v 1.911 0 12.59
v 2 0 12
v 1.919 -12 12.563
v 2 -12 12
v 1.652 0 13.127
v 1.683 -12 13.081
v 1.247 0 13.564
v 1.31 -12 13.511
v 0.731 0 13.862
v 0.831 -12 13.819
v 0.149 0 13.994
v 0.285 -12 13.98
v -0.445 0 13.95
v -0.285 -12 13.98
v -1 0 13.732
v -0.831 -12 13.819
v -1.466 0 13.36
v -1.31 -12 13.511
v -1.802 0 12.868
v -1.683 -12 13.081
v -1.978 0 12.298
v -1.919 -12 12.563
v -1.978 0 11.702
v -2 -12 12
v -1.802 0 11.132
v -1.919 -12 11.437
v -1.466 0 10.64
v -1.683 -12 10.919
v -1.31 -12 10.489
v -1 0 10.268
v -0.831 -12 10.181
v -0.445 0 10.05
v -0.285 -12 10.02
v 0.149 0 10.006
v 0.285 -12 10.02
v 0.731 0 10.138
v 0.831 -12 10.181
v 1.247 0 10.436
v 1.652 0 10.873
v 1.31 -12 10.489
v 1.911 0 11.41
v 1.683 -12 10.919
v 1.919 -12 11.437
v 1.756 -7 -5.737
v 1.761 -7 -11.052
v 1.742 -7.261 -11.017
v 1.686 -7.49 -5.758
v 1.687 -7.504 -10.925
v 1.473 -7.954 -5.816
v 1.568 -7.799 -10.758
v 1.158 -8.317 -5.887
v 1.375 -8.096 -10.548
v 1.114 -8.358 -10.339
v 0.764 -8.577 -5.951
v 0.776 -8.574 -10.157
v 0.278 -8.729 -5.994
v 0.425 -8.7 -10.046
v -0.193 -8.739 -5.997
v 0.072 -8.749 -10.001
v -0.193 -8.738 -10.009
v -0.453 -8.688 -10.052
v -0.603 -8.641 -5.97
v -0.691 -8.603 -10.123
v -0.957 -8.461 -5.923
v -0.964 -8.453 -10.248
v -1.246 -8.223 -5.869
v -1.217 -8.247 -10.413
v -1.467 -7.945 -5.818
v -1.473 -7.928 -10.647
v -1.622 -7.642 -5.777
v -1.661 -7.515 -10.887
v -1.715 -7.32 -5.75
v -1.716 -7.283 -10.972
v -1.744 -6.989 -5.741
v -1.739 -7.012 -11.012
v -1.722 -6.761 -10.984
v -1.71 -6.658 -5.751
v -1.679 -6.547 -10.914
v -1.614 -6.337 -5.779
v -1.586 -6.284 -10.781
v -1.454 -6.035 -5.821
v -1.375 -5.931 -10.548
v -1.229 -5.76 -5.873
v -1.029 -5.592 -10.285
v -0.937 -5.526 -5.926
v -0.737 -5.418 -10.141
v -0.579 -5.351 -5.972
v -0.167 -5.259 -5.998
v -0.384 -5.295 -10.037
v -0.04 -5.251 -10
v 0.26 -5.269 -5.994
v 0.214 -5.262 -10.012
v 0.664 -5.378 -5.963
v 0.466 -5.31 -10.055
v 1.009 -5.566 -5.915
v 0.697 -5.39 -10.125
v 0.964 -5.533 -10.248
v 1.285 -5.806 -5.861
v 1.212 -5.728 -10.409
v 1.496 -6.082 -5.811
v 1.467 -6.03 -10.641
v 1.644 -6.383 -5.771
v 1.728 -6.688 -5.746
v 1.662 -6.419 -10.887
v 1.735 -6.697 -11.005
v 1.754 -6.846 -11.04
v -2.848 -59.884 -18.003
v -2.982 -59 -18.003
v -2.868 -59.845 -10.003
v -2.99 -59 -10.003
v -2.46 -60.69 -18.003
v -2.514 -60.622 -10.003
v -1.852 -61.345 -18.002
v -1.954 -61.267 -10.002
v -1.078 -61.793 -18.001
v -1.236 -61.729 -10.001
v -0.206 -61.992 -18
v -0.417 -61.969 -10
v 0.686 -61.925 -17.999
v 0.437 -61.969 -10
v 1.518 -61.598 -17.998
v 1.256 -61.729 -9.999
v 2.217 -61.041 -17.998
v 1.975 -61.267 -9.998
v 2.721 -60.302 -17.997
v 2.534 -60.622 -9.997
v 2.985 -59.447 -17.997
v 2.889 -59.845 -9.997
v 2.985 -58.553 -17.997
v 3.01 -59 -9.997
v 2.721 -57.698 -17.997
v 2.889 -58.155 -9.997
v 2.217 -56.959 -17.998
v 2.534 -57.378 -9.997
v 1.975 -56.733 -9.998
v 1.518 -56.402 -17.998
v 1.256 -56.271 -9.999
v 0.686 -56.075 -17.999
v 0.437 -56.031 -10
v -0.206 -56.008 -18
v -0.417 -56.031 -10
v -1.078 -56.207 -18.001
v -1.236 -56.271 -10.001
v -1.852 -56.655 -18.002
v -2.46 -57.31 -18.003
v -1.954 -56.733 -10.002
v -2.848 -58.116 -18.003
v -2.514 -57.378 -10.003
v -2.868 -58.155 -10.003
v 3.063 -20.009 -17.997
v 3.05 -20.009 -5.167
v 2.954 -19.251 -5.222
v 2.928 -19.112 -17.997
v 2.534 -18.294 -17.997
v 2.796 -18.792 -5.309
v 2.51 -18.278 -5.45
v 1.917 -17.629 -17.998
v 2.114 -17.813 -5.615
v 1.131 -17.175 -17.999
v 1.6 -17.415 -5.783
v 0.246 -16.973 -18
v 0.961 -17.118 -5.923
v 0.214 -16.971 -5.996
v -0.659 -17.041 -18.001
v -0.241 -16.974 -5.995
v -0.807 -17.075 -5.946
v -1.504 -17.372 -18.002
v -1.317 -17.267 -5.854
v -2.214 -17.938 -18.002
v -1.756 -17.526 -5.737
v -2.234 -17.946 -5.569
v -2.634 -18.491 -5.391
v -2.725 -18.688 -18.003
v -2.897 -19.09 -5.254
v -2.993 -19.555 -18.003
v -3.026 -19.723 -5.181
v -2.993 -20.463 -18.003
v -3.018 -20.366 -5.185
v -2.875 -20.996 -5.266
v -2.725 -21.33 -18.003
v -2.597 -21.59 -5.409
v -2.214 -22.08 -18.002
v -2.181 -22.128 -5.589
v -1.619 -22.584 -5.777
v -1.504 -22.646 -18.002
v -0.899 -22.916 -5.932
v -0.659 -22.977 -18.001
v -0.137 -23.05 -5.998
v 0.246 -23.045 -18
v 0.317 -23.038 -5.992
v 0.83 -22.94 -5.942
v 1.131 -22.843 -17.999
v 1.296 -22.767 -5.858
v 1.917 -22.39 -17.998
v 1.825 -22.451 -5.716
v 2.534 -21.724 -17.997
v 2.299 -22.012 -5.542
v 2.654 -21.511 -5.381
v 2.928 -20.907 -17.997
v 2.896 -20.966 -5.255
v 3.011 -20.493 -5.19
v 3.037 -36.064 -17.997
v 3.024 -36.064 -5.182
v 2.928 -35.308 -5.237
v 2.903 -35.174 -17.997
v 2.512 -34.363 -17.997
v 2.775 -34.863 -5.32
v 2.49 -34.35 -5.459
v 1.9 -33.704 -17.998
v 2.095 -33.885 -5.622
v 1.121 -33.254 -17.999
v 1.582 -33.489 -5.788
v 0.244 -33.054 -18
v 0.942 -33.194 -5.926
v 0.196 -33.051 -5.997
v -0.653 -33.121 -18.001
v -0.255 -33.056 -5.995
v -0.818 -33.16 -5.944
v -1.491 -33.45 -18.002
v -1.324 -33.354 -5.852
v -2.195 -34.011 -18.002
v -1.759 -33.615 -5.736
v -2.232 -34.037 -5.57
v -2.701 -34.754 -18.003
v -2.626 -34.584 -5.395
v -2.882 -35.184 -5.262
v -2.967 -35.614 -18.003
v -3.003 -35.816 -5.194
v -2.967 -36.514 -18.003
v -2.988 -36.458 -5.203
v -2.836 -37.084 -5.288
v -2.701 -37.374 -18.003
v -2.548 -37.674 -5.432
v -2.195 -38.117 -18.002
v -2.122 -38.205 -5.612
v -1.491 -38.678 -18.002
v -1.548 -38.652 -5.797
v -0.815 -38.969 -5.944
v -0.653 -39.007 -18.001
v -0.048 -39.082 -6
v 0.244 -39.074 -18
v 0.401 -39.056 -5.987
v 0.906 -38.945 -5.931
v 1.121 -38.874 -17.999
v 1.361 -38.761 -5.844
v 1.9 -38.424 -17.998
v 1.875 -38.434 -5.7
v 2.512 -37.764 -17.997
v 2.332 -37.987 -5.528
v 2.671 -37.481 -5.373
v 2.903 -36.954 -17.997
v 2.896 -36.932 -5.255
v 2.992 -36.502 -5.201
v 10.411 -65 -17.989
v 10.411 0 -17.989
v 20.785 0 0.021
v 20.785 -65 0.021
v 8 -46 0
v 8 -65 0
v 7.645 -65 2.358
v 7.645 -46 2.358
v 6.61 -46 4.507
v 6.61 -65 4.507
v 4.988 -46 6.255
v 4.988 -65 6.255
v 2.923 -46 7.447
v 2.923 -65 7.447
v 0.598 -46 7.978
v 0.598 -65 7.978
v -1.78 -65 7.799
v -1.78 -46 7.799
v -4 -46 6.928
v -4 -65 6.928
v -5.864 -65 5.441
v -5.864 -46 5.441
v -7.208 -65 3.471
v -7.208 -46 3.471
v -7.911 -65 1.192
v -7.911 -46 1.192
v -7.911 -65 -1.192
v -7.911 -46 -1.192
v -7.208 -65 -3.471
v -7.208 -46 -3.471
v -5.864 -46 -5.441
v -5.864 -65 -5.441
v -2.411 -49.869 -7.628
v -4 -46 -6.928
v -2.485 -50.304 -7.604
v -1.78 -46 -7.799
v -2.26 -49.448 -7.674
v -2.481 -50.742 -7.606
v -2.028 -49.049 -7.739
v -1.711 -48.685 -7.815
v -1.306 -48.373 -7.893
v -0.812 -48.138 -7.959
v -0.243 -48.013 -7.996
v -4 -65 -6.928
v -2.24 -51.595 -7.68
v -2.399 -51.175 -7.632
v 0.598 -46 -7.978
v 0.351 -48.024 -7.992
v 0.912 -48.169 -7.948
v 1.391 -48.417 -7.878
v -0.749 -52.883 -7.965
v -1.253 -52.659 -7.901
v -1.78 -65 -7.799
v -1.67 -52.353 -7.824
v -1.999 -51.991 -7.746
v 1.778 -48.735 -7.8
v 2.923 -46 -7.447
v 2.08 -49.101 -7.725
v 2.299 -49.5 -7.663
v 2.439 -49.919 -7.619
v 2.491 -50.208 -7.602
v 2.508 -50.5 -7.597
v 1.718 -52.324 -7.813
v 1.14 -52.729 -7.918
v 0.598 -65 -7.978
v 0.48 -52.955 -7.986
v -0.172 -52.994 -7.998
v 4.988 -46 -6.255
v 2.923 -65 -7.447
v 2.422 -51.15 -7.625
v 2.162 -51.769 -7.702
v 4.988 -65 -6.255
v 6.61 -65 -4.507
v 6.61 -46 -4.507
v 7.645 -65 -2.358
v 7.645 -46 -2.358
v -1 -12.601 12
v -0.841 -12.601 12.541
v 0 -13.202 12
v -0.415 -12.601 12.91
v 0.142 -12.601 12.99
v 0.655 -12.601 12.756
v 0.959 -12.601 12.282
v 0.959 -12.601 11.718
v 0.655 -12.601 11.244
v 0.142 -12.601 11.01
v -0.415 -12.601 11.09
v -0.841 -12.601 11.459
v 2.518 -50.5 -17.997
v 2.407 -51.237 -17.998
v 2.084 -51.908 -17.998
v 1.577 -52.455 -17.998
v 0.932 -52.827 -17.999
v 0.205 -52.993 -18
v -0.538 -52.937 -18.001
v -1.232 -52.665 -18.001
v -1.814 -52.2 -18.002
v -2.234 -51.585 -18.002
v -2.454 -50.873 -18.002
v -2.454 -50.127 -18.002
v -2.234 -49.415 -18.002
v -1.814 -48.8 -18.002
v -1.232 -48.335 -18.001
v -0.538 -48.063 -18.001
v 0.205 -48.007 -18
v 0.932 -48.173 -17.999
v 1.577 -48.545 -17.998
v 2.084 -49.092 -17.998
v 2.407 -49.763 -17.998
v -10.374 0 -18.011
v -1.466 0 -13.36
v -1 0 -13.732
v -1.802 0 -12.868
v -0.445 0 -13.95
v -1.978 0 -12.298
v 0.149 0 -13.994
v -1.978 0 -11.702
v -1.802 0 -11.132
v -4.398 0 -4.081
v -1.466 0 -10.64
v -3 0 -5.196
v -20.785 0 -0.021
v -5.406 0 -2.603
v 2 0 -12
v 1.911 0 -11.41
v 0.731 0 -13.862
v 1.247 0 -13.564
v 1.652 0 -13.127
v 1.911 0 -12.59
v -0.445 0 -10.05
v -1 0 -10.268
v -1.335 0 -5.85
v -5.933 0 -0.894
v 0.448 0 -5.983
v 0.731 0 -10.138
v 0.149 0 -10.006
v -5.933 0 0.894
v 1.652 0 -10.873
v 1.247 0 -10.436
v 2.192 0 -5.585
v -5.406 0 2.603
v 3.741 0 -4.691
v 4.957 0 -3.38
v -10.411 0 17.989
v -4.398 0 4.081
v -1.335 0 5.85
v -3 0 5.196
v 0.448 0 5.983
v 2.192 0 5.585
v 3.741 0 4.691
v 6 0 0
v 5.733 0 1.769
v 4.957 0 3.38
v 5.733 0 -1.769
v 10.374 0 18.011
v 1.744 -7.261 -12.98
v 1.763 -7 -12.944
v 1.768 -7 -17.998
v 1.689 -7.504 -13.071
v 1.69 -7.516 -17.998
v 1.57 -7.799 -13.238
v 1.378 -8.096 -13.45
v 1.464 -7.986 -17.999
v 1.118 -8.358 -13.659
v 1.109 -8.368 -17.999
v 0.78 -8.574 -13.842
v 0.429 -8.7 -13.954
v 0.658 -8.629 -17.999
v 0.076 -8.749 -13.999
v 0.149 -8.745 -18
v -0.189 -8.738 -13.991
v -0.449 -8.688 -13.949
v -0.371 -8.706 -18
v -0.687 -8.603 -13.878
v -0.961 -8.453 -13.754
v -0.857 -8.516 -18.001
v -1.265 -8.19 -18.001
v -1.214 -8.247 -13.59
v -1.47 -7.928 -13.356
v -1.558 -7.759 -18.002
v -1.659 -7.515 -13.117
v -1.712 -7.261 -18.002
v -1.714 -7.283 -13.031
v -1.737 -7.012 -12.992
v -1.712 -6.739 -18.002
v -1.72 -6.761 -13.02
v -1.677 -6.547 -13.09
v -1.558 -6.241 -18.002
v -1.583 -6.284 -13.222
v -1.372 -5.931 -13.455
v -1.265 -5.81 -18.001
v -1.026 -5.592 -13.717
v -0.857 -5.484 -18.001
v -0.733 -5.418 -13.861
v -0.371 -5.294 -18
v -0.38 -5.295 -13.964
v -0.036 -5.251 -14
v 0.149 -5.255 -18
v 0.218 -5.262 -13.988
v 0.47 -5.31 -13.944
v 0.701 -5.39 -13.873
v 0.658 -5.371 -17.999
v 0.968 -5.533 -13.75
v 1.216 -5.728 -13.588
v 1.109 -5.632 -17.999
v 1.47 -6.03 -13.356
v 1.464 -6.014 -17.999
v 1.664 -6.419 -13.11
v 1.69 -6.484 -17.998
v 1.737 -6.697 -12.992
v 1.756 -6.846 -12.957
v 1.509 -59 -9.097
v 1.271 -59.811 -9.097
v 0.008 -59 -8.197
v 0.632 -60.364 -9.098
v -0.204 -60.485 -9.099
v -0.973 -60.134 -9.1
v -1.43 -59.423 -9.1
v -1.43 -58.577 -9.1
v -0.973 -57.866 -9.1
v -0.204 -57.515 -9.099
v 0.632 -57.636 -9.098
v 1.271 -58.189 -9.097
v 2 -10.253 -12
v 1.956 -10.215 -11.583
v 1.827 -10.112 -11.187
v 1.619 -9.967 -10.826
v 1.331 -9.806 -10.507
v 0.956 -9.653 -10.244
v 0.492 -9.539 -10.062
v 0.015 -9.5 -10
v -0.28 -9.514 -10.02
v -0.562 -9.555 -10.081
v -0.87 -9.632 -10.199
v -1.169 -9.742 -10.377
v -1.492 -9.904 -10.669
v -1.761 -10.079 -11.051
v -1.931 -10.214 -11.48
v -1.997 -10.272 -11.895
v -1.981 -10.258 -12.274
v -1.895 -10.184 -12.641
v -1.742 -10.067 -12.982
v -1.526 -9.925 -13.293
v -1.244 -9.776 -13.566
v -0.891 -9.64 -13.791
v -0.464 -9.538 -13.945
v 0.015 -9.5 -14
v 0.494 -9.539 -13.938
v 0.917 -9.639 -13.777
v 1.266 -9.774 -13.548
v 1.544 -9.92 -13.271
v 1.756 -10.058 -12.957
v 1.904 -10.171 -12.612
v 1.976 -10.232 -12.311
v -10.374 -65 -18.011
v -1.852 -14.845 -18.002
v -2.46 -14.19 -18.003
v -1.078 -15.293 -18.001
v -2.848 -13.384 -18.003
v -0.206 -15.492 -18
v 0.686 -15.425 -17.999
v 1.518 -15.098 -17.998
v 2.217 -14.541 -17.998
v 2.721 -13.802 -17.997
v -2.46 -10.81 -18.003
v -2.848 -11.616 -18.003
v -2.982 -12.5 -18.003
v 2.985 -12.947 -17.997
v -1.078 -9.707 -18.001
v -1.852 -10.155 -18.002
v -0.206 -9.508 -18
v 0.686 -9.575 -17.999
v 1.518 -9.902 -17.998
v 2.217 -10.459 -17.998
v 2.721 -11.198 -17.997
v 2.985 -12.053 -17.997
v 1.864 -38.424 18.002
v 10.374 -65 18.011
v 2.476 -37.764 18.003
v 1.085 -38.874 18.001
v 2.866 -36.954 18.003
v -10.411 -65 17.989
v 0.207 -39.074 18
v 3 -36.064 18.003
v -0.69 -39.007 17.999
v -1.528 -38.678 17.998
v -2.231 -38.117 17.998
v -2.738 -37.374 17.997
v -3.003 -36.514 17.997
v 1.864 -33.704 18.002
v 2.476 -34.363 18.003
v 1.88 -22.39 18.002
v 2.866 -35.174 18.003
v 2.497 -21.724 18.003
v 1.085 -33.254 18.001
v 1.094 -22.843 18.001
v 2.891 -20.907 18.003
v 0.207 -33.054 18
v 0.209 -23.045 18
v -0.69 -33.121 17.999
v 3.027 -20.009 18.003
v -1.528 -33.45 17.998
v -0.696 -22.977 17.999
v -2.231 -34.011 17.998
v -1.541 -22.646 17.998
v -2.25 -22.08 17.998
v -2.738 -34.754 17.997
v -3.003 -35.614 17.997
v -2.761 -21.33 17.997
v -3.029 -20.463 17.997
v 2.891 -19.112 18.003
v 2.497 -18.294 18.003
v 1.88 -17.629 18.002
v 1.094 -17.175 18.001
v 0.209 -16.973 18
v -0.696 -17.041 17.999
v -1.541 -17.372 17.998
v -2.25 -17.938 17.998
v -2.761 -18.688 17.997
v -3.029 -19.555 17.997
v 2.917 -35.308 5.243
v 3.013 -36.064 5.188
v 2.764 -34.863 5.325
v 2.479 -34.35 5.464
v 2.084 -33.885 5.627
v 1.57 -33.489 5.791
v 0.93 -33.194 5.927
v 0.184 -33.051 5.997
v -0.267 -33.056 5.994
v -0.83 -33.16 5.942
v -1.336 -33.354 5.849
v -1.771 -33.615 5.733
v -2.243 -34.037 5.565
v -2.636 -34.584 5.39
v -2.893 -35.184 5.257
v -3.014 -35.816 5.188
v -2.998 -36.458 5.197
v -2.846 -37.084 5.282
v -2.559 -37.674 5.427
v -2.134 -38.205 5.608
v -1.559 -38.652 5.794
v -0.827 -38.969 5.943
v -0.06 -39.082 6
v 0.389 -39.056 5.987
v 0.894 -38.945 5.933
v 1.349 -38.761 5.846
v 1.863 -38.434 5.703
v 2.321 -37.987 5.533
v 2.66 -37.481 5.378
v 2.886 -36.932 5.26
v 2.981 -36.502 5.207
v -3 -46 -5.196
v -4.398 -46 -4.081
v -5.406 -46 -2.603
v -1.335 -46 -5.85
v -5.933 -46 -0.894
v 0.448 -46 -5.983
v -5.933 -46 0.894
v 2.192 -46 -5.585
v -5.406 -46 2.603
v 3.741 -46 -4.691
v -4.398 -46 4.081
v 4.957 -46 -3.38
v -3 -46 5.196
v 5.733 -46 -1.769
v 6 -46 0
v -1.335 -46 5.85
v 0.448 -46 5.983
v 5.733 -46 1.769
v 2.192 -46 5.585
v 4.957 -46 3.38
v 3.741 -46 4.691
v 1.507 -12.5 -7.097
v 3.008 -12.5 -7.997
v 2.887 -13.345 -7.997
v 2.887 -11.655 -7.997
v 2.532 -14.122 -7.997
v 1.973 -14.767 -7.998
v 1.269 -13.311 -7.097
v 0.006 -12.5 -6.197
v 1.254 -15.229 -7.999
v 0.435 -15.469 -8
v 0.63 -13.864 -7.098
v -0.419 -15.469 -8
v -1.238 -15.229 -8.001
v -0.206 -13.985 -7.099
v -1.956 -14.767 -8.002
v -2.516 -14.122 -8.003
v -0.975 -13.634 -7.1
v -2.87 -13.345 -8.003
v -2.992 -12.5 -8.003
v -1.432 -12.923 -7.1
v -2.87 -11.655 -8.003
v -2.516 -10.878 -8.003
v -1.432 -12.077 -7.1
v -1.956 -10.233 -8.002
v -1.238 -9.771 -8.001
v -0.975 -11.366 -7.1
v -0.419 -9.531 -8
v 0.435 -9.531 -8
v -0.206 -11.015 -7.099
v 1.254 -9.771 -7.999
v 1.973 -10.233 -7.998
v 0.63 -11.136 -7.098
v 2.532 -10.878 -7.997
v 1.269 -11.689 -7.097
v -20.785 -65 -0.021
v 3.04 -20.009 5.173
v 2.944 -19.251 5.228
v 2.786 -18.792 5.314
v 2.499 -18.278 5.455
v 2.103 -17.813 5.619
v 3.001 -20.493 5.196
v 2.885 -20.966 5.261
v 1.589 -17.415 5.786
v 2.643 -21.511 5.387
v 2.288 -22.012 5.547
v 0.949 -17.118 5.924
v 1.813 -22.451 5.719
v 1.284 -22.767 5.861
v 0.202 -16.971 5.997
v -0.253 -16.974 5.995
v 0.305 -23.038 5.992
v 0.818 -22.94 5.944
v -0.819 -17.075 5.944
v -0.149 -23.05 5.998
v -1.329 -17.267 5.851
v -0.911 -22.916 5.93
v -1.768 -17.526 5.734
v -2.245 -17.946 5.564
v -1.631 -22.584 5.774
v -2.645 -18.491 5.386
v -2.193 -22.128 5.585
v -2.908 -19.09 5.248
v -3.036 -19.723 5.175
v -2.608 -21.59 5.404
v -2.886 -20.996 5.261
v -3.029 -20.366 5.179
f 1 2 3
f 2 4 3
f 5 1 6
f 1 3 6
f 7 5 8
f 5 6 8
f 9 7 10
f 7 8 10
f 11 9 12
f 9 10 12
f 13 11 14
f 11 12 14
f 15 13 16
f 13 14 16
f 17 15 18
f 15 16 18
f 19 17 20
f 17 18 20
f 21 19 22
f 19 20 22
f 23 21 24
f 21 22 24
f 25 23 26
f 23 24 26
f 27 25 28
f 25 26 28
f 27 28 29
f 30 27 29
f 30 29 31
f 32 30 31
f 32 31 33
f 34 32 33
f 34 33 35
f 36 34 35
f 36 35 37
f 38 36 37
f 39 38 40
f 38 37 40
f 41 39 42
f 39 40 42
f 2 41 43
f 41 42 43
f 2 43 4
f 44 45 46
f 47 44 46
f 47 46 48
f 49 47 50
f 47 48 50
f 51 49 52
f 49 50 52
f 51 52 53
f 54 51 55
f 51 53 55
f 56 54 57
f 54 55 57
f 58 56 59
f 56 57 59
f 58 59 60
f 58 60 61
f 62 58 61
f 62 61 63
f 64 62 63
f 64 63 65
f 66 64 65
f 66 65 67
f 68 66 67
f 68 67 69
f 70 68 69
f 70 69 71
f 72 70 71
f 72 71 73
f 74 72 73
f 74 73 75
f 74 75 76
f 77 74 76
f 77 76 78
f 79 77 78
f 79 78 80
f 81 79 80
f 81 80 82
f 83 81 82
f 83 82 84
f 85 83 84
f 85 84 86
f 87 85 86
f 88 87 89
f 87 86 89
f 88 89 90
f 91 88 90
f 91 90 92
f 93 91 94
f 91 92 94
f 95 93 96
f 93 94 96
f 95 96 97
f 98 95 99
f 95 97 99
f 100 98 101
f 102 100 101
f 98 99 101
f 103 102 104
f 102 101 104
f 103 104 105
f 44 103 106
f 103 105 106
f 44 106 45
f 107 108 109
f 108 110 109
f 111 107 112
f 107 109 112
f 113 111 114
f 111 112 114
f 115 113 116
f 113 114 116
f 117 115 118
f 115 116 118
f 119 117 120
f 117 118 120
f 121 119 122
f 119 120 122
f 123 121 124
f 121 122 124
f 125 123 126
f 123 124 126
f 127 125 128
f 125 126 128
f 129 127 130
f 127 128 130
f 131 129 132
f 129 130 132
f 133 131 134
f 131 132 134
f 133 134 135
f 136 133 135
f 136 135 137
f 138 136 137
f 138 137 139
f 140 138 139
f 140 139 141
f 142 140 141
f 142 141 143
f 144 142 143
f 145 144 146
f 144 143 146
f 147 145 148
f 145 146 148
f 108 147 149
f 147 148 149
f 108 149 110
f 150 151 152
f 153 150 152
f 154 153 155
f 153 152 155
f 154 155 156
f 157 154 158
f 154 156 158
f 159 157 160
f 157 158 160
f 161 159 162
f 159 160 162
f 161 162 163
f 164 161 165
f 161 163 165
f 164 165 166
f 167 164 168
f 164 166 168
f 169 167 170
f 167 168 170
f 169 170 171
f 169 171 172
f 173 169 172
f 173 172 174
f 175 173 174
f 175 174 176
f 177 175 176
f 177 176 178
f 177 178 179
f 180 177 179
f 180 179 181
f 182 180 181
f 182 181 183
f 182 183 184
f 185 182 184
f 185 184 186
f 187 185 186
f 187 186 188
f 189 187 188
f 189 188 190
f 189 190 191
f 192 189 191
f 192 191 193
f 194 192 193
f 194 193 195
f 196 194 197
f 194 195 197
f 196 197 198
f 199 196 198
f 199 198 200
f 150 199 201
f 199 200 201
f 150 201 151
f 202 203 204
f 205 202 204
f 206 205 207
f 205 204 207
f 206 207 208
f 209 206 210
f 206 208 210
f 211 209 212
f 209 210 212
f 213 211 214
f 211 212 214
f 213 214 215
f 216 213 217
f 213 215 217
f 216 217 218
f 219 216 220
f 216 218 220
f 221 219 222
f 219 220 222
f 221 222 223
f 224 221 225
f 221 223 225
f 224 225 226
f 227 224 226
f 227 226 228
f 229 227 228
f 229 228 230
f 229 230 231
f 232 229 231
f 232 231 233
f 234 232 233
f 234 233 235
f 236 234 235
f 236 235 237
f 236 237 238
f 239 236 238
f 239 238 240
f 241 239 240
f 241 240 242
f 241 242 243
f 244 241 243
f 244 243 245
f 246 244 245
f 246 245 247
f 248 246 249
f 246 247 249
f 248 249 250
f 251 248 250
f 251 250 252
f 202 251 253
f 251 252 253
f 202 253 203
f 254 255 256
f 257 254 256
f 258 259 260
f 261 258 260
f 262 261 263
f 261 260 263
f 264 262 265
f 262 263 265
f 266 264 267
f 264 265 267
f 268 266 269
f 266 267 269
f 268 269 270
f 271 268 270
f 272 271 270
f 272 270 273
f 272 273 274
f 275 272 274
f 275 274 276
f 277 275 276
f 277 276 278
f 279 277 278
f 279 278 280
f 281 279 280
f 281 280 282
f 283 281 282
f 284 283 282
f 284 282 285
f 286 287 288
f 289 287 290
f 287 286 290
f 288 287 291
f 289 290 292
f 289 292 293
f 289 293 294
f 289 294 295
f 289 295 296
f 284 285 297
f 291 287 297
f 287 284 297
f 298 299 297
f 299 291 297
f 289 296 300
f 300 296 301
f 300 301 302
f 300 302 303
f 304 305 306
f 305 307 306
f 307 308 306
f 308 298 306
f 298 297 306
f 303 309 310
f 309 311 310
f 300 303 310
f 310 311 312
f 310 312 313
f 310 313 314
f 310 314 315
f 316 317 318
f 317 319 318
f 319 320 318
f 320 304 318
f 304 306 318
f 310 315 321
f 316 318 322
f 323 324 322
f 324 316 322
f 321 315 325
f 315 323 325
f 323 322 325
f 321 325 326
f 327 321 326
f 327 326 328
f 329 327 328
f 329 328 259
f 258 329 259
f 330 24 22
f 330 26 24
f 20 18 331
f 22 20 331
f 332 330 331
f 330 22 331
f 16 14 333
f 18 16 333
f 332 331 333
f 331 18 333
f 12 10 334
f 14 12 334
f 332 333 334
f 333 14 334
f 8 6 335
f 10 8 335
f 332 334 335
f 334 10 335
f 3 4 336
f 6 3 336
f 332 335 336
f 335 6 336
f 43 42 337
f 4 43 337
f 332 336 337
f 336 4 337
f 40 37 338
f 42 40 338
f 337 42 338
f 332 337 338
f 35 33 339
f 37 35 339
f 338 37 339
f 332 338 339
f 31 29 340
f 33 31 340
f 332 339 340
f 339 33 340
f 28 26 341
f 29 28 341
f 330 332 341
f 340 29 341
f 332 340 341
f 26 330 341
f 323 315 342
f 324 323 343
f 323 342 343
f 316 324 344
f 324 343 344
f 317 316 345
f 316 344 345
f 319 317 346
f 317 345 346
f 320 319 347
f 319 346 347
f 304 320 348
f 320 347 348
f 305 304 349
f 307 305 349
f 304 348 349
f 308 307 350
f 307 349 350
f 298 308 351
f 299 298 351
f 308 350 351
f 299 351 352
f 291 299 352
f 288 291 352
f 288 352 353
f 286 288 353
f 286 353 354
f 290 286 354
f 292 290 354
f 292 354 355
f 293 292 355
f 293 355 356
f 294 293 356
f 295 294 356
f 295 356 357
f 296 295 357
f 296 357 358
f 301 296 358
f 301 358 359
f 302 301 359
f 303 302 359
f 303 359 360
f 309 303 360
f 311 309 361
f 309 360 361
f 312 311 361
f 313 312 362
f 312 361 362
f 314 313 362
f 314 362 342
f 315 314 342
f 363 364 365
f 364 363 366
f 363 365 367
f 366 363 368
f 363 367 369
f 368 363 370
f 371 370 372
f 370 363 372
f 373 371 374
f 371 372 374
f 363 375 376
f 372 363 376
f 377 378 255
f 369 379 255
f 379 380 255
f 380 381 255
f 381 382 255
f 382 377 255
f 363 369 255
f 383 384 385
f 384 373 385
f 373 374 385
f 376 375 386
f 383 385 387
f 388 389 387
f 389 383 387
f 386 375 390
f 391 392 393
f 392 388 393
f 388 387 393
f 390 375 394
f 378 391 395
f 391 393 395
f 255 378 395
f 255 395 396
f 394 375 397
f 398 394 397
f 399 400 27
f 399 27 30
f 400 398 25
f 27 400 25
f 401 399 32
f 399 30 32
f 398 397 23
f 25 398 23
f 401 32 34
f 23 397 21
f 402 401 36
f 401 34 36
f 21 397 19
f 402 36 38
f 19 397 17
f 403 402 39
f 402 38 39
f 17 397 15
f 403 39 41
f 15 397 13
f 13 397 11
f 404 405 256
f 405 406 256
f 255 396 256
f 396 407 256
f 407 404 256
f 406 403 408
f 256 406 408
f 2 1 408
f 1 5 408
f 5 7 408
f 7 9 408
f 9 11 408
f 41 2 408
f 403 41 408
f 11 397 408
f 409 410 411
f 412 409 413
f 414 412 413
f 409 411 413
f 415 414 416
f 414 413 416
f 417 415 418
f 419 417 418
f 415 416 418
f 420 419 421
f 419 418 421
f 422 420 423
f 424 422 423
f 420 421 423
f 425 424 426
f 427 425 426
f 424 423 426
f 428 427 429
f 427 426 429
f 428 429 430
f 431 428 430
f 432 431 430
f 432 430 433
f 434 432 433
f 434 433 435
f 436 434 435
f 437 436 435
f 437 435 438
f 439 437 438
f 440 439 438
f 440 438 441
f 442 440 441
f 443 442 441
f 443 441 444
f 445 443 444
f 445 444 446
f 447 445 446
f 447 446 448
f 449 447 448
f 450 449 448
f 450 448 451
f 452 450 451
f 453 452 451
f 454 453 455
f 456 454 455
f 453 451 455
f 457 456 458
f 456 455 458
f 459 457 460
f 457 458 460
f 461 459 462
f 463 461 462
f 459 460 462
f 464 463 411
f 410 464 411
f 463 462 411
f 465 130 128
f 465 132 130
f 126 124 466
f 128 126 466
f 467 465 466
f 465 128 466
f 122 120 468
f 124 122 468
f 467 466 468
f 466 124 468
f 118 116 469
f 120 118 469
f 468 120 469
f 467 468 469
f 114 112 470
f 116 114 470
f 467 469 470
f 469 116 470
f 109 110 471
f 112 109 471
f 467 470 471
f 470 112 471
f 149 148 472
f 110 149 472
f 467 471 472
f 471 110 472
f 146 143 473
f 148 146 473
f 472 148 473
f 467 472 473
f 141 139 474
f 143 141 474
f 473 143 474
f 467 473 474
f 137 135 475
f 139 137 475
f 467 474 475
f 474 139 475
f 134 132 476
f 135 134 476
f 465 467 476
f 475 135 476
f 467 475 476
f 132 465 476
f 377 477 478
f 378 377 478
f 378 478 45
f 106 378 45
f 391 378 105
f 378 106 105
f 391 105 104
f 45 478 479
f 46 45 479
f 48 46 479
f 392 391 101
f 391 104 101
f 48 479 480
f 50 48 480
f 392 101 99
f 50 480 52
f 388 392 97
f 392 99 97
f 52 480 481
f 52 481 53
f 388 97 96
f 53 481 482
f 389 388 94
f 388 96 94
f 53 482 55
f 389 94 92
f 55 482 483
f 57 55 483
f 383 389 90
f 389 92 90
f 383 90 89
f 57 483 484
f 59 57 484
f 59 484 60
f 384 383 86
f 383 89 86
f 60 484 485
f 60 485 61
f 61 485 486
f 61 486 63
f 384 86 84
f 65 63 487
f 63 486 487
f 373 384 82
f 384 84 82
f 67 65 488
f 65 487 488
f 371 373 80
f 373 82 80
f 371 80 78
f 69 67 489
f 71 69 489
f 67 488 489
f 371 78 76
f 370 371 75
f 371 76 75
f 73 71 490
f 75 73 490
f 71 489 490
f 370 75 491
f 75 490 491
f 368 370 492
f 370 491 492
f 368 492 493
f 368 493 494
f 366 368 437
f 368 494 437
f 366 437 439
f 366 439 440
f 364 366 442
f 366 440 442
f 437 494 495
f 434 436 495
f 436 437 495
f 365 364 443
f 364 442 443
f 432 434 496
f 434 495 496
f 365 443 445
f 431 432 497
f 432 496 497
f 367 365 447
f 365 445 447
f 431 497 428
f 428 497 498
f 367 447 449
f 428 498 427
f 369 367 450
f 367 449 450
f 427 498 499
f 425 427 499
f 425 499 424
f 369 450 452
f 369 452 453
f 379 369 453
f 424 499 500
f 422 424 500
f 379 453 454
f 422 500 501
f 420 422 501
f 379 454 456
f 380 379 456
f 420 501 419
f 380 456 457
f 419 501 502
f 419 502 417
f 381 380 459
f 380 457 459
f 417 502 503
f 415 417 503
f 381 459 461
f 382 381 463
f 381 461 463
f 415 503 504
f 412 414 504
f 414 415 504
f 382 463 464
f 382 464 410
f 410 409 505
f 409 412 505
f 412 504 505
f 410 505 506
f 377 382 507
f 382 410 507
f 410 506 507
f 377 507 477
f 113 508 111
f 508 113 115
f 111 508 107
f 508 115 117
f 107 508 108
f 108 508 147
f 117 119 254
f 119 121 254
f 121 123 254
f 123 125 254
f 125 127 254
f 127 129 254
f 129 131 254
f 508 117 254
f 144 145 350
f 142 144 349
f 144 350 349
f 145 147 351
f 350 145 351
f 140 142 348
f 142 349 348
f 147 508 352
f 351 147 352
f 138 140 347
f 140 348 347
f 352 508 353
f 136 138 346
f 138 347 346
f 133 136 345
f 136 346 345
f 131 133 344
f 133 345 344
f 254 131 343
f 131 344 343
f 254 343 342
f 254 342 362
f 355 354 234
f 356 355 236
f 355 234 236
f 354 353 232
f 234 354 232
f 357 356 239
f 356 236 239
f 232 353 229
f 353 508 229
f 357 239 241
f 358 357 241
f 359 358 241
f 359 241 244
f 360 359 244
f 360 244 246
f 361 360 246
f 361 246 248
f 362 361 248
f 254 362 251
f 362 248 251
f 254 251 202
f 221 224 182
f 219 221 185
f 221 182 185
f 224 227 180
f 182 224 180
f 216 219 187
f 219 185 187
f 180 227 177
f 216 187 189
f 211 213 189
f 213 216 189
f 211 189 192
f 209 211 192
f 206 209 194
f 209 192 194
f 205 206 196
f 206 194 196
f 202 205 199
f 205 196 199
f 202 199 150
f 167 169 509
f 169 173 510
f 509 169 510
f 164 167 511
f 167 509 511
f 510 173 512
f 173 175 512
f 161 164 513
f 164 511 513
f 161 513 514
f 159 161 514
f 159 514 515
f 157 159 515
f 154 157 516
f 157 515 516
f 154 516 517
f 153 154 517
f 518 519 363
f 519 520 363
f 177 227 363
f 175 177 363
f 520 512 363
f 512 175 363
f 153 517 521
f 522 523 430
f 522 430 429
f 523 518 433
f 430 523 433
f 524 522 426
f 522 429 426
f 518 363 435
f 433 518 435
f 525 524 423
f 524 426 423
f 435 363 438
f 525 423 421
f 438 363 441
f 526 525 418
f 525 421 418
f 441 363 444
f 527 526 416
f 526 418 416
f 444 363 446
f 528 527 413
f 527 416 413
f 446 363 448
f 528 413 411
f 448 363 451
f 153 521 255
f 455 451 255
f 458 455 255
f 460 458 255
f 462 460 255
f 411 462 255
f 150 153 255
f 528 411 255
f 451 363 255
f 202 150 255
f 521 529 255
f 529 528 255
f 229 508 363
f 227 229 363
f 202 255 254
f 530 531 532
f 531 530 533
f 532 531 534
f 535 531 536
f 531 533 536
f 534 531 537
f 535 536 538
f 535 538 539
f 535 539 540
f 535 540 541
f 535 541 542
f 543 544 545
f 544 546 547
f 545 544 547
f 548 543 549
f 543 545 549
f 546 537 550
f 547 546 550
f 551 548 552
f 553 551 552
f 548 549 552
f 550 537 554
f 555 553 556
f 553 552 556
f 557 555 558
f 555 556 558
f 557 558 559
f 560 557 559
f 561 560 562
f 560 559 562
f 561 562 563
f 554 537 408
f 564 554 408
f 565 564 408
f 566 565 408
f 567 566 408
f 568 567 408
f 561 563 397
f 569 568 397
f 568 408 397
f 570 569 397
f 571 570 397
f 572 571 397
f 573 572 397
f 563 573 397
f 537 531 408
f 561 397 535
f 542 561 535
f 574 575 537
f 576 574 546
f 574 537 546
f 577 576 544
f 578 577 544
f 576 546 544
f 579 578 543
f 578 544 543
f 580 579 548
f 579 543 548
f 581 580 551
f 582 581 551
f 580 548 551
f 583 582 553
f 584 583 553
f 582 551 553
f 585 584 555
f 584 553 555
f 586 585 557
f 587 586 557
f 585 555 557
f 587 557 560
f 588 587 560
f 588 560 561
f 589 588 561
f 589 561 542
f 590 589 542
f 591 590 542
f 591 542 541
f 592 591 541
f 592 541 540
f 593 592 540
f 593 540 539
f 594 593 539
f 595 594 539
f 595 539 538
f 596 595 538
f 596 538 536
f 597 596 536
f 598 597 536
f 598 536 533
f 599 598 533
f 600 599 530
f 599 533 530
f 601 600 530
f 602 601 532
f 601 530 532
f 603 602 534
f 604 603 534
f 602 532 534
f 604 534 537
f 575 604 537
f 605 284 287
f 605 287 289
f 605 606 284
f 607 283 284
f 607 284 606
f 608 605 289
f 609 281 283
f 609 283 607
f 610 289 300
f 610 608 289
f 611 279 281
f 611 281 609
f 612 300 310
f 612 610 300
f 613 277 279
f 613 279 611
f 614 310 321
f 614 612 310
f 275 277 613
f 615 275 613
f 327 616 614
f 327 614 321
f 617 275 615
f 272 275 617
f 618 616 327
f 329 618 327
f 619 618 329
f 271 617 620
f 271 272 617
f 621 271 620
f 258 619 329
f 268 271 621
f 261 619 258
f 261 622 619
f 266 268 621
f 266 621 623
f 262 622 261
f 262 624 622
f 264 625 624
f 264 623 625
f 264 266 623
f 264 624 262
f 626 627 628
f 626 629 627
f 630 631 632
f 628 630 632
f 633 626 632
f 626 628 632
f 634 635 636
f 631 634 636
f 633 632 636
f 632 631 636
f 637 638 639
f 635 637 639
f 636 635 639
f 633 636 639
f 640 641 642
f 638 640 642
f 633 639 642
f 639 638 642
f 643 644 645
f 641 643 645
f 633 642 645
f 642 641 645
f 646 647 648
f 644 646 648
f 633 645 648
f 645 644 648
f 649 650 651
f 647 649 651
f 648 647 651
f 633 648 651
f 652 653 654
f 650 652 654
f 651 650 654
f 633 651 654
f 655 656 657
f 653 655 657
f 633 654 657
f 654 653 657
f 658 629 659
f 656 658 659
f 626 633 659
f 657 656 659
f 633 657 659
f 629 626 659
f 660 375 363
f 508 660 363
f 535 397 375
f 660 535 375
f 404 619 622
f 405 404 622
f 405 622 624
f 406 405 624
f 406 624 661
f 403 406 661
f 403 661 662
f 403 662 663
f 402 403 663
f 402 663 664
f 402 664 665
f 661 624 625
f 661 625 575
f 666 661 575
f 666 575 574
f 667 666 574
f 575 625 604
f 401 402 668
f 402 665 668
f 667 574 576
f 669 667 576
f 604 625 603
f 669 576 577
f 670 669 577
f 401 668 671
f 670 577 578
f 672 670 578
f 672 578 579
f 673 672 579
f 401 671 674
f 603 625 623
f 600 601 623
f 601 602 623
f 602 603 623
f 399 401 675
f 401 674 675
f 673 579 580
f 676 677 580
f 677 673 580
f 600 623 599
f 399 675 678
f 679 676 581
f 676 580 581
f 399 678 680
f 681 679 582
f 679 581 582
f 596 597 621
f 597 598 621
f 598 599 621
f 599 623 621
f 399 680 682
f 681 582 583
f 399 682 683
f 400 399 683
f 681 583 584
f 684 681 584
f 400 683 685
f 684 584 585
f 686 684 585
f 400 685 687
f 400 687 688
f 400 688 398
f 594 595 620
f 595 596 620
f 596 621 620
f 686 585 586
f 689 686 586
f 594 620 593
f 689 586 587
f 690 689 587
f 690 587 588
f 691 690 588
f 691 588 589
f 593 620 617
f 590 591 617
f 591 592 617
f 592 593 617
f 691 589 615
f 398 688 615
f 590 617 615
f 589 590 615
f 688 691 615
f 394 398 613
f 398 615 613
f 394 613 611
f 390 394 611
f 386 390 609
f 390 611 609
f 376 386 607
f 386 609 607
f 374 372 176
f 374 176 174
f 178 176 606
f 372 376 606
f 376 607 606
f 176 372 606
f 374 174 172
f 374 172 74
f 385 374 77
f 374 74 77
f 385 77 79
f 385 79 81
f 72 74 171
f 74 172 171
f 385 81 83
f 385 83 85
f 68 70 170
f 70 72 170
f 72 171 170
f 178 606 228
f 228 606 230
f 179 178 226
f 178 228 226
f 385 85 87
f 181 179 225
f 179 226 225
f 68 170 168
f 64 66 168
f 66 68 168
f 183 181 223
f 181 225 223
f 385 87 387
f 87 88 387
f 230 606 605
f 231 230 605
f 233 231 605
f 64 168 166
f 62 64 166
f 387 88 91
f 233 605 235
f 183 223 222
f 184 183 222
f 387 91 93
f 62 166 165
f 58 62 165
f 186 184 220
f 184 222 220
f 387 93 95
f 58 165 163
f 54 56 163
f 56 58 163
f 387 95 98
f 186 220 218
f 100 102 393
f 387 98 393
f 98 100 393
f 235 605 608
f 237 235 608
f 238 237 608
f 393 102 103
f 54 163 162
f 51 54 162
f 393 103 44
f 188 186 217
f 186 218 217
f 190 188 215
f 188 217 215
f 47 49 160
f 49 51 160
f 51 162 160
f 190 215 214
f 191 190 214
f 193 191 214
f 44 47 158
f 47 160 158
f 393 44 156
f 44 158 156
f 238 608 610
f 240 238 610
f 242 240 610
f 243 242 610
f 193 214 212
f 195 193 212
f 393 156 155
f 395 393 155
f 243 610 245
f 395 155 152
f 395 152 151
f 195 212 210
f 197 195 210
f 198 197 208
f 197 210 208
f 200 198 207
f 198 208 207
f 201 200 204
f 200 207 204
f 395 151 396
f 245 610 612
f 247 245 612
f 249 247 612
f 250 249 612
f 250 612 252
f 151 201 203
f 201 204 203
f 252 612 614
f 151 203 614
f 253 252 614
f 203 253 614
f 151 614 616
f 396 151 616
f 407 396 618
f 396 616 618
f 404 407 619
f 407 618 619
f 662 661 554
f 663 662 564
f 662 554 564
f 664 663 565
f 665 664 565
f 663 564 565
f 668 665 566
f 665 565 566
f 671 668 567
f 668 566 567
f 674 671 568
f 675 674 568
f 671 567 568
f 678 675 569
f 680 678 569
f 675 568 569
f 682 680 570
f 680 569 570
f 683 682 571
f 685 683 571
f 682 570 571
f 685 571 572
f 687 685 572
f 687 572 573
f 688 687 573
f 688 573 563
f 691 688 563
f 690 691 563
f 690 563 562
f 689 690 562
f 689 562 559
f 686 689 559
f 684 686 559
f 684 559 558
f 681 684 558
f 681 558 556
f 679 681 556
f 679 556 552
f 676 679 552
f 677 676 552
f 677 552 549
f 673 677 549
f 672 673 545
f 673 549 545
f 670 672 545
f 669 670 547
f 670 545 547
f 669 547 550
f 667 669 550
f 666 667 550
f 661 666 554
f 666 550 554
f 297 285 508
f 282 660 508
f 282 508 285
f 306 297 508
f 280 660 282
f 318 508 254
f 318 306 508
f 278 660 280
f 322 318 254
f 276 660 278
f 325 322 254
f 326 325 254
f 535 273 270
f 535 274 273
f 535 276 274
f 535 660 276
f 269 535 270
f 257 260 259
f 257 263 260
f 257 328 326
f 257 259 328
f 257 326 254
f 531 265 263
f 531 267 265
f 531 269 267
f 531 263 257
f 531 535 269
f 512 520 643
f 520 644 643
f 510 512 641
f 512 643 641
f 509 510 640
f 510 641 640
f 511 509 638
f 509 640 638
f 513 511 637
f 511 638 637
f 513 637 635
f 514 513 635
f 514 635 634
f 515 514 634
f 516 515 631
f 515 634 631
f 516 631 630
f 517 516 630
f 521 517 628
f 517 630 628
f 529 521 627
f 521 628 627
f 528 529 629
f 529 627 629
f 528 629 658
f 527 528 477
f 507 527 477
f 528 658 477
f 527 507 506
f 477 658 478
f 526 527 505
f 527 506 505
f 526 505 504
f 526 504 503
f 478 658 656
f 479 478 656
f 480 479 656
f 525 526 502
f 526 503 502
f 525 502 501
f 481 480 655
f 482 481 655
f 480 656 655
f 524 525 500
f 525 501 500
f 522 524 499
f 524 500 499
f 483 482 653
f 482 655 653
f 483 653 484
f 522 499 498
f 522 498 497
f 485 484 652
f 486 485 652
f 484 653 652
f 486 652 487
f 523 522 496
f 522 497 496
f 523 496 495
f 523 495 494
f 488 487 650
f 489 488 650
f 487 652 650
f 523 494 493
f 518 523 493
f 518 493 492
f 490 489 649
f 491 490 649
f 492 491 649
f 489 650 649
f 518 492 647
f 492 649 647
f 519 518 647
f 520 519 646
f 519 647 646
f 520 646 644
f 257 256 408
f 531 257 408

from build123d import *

# Parameters (mm, degrees)
F1_DEPTH  = 65
F2_R      = 6
F3_DEPTH  = 65
F4_R      = 3.0447564862
F5_DEPTH  = 36
F6_R      = 3.0186568284
F7_DEPTH  = 36
F8_R      = 1.75
F9_DEPTH  = 14
F10_R     = 2.5
F11_DEPTH = 14
F12_R     = 8
F12_R_2   = 6
F13_DEPTH = 19
F16_D     = 4
F16_DEPTH = 12
F16_TIP   = 1.2017212381
F18_D     = 4
F18_DEPTH = 12
F18_TIP   = 1.2017212381
F20_D     = 6
F20_DEPTH = 8
F20_TIP   = 1.8025818571
F22_D     = 6
F22_DEPTH = 10
F22_TIP   = 1.8025818571


with BuildPart() as f1:
    # F0 (on Front) → F1 (new body)
    with BuildSketch(Plane.XZ):
        Polygon((10.4105382668, -17.9894606088), (20.784599021, 0.0210603017), (10.3740607542, 18.0105209105), (-10.4105382668, 17.9894606088), (-20.784599021, -0.0210603017), (-10.3740607542, -18.0105209105), align=None)
    extrude(amount=F1_DEPTH)

    # F2 (on face) → F3 (cut)
    with BuildSketch(Plane.XZ.offset(65)):
        Circle(F2_R)
    extrude(amount=-F3_DEPTH, mode=Mode.SUBTRACT)

    # F4 (on face) → F5 (cut)
    with BuildSketch(Plane(origin=(-0.0182387563, 0, 17.9999907597), x_dir=(0.9999994866, 0, 0.0010132642), z_dir=(-0.0010132642, 0, 0.9999994866))):
        with Locations((0, -20.0090762228)):
            Circle(F4_R)
    extrude(amount=-F5_DEPTH, mode=Mode.SUBTRACT)

    # F6 (on face) → F7 (cut)
    with BuildSketch(Plane(origin=(-0.0182387563, 0, 17.9999907597), x_dir=(0.9999994866, 0, 0.0010132642), z_dir=(-0.0010132642, 0, 0.9999994866))):
        with Locations((0, -36.0637567937)):
            Circle(F6_R)
    extrude(amount=-F7_DEPTH, mode=Mode.SUBTRACT)

    # F8 (on face) → F9 (cut)
    with BuildSketch(Plane(origin=(0.0182387563, 0, -17.9999907597), x_dir=(0.9999994866, 0, 0.0010132642), z_dir=(0.0010132642, 0, -0.9999994866))):
        with Locations((0, 7)):
            Circle(F8_R)
    extrude(amount=-F9_DEPTH, mode=Mode.SUBTRACT)

    # F10 (on face) → F11 (cut)
    with BuildSketch(Plane(origin=(0.0182387563, 0, -17.9999907597), x_dir=(0.9999994866, 0, 0.0010132642), z_dir=(0.0010132642, 0, -0.9999994866))):
        with Locations((0, 50.5)):
            Circle(F10_R)
    extrude(amount=-F11_DEPTH, mode=Mode.SUBTRACT)

    # F12 (on face) → F13 (cut)
    with BuildSketch(Plane.XZ.offset(65)):
        Circle(F12_R)
        Circle(F12_R_2, mode=Mode.SUBTRACT)
    extrude(amount=-F13_DEPTH, mode=Mode.SUBTRACT)

    # F16
    with Locations(Plane(origin=(0, 0, 0), x_dir=(-1, 0, 0), z_dir=(0, 1, 0))):
        with Locations((0, 12)):
            Hole(F16_D / 2, depth=F16_DEPTH)
            with Locations((0, 0, -(F16_DEPTH + F16_TIP / 2))):  # 118° drill point
                Cone(0, F16_D / 2, F16_TIP, mode=Mode.SUBTRACT)

    # F18
    with Locations(Plane(origin=(0, 0, 0), x_dir=(-1, 0, 0), z_dir=(0, 1, 0))):
        with Locations((0, -12)):
            Hole(F18_D / 2, depth=F18_DEPTH)
            with Locations((0, 0, -(F18_DEPTH + F18_TIP / 2))):  # 118° drill point
                Cone(0, F18_D / 2, F18_TIP, mode=Mode.SUBTRACT)

    # F20
    with Locations(Plane(origin=(0.0182387563, 0, -17.9999907597), x_dir=(0.9999994866, 0, 0.0010132642), z_dir=(0.0010132642, 0, -0.9999994866))):
        with Locations((0, 59)):
            Hole(F20_D / 2, depth=F20_DEPTH)
            with Locations((0, 0, -(F20_DEPTH + F20_TIP / 2))):  # 118° drill point
                Cone(0, F20_D / 2, F20_TIP, mode=Mode.SUBTRACT)

    # F22
    with Locations(Plane(origin=(0.0182387563, 0, -17.9999907597), x_dir=(0.9999994866, 0, 0.0010132642), z_dir=(0.0010132642, 0, -0.9999994866))):
        with Locations((0, 12.5)):
            Hole(F22_D / 2, depth=F22_DEPTH)
            with Locations((0, 0, -(F22_DEPTH + F22_TIP / 2))):  # 118° drill point
                Cone(0, F22_D / 2, F22_TIP, mode=Mode.SUBTRACT)


solid = f1.part
